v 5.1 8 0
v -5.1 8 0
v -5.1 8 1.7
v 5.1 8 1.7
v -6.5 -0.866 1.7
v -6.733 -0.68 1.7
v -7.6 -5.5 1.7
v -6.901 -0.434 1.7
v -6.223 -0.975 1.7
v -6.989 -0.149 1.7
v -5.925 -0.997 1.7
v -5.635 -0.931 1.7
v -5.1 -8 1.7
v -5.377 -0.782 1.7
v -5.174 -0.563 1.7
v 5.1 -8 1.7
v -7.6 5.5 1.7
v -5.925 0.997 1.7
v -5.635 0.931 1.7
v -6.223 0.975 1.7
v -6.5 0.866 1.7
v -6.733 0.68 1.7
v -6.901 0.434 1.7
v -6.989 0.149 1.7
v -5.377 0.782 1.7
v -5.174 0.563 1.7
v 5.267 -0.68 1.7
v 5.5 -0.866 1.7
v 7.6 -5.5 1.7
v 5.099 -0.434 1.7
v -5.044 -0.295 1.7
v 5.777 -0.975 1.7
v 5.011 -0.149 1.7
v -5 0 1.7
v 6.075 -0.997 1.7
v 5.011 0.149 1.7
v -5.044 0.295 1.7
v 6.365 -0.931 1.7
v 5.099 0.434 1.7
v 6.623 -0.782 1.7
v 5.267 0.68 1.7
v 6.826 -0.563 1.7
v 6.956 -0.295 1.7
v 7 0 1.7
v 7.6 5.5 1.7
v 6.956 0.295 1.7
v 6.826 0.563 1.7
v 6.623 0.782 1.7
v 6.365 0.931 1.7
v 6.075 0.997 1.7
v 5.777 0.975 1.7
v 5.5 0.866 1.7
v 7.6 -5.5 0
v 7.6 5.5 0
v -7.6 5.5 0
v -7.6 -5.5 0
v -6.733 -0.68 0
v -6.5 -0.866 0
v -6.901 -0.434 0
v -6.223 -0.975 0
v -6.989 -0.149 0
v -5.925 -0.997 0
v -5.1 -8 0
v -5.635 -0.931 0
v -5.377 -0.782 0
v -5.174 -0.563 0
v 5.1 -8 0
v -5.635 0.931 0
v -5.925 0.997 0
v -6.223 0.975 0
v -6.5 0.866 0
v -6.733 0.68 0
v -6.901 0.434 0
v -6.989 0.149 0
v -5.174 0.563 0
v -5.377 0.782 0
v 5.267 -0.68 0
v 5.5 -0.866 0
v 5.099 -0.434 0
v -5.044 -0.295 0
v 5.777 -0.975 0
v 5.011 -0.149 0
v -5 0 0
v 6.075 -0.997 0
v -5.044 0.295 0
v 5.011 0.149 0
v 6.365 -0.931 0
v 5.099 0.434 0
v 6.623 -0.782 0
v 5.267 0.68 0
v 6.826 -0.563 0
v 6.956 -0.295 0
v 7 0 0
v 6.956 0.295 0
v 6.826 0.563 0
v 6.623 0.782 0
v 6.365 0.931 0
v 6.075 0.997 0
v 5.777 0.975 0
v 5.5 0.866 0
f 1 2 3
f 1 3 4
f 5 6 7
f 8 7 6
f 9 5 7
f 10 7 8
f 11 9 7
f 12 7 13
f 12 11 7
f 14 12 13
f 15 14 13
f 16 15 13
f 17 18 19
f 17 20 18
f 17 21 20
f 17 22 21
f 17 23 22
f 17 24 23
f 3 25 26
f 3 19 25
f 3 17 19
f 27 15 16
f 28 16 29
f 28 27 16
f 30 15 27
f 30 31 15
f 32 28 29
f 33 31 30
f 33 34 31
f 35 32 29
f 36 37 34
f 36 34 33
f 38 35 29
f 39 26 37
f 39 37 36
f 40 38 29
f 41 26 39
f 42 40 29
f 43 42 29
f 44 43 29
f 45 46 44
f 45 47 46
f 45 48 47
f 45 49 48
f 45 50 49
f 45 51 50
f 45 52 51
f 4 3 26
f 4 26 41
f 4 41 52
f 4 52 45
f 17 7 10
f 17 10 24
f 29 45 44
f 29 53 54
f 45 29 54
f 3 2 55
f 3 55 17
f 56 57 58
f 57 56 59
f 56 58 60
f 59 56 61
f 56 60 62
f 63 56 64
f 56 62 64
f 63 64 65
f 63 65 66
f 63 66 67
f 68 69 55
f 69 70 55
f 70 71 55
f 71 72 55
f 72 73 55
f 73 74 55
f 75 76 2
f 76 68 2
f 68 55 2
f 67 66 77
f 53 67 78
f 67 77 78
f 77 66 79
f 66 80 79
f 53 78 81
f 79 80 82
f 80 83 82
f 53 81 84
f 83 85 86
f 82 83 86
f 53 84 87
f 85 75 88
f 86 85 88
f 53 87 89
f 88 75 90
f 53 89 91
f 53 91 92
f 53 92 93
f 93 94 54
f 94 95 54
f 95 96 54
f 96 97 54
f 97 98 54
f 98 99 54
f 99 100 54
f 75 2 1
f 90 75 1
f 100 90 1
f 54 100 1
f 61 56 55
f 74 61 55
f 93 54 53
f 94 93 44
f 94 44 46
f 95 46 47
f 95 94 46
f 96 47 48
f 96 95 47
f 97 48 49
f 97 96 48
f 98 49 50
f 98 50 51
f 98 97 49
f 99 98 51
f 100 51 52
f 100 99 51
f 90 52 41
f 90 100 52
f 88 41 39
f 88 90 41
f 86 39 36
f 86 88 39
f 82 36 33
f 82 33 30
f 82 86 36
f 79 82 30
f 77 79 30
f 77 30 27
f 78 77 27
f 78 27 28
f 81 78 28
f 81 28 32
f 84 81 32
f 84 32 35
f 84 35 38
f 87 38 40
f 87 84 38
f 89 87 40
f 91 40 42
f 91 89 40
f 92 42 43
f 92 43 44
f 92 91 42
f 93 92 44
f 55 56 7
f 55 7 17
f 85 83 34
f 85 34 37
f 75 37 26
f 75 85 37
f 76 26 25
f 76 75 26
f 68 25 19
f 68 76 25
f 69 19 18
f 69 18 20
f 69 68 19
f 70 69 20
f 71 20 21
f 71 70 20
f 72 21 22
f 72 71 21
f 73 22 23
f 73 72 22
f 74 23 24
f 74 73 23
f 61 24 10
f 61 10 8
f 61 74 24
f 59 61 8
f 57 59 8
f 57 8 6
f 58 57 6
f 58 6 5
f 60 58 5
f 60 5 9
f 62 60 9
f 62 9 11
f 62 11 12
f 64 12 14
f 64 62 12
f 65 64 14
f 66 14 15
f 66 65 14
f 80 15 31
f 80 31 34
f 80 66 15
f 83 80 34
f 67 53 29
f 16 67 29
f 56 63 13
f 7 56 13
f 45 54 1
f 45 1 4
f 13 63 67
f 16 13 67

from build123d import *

# Parameters (mm, degrees)
ESQUISSE1_W        = 15.2
ESQUISSE1_H        = 16
ESQUISSE1_R        = 1
BOSS_EXTRU_1_DEPTH = 1.7
CHANFREIN1_SIZE    = 2.5


with BuildPart() as part:
    # Esquisse1 → Boss.-Extru.1 (new body)
    with BuildSketch(Plane.XY):
        Rectangle(ESQUISSE1_W, ESQUISSE1_H)
        with Locations((-6, 0)):
            Circle(ESQUISSE1_R, mode=Mode.SUBTRACT)
        with Locations((6, 0)):
            Circle(ESQUISSE1_R, mode=Mode.SUBTRACT)
    extrude(amount=BOSS_EXTRU_1_DEPTH)

    # Chanfrein1
    chanfrein1_edges = [part.edges().sort_by_distance(p)[0] for p in [
        (-7.6, 8, 0.85),
        (7.6, 8, 0.85),
        (7.6, -8, 0.85),
        (-7.6, -8, 0.85),
    ]]
    chamfer(chanfrein1_edges, length=CHANFREIN1_SIZE)


solid = part.part
